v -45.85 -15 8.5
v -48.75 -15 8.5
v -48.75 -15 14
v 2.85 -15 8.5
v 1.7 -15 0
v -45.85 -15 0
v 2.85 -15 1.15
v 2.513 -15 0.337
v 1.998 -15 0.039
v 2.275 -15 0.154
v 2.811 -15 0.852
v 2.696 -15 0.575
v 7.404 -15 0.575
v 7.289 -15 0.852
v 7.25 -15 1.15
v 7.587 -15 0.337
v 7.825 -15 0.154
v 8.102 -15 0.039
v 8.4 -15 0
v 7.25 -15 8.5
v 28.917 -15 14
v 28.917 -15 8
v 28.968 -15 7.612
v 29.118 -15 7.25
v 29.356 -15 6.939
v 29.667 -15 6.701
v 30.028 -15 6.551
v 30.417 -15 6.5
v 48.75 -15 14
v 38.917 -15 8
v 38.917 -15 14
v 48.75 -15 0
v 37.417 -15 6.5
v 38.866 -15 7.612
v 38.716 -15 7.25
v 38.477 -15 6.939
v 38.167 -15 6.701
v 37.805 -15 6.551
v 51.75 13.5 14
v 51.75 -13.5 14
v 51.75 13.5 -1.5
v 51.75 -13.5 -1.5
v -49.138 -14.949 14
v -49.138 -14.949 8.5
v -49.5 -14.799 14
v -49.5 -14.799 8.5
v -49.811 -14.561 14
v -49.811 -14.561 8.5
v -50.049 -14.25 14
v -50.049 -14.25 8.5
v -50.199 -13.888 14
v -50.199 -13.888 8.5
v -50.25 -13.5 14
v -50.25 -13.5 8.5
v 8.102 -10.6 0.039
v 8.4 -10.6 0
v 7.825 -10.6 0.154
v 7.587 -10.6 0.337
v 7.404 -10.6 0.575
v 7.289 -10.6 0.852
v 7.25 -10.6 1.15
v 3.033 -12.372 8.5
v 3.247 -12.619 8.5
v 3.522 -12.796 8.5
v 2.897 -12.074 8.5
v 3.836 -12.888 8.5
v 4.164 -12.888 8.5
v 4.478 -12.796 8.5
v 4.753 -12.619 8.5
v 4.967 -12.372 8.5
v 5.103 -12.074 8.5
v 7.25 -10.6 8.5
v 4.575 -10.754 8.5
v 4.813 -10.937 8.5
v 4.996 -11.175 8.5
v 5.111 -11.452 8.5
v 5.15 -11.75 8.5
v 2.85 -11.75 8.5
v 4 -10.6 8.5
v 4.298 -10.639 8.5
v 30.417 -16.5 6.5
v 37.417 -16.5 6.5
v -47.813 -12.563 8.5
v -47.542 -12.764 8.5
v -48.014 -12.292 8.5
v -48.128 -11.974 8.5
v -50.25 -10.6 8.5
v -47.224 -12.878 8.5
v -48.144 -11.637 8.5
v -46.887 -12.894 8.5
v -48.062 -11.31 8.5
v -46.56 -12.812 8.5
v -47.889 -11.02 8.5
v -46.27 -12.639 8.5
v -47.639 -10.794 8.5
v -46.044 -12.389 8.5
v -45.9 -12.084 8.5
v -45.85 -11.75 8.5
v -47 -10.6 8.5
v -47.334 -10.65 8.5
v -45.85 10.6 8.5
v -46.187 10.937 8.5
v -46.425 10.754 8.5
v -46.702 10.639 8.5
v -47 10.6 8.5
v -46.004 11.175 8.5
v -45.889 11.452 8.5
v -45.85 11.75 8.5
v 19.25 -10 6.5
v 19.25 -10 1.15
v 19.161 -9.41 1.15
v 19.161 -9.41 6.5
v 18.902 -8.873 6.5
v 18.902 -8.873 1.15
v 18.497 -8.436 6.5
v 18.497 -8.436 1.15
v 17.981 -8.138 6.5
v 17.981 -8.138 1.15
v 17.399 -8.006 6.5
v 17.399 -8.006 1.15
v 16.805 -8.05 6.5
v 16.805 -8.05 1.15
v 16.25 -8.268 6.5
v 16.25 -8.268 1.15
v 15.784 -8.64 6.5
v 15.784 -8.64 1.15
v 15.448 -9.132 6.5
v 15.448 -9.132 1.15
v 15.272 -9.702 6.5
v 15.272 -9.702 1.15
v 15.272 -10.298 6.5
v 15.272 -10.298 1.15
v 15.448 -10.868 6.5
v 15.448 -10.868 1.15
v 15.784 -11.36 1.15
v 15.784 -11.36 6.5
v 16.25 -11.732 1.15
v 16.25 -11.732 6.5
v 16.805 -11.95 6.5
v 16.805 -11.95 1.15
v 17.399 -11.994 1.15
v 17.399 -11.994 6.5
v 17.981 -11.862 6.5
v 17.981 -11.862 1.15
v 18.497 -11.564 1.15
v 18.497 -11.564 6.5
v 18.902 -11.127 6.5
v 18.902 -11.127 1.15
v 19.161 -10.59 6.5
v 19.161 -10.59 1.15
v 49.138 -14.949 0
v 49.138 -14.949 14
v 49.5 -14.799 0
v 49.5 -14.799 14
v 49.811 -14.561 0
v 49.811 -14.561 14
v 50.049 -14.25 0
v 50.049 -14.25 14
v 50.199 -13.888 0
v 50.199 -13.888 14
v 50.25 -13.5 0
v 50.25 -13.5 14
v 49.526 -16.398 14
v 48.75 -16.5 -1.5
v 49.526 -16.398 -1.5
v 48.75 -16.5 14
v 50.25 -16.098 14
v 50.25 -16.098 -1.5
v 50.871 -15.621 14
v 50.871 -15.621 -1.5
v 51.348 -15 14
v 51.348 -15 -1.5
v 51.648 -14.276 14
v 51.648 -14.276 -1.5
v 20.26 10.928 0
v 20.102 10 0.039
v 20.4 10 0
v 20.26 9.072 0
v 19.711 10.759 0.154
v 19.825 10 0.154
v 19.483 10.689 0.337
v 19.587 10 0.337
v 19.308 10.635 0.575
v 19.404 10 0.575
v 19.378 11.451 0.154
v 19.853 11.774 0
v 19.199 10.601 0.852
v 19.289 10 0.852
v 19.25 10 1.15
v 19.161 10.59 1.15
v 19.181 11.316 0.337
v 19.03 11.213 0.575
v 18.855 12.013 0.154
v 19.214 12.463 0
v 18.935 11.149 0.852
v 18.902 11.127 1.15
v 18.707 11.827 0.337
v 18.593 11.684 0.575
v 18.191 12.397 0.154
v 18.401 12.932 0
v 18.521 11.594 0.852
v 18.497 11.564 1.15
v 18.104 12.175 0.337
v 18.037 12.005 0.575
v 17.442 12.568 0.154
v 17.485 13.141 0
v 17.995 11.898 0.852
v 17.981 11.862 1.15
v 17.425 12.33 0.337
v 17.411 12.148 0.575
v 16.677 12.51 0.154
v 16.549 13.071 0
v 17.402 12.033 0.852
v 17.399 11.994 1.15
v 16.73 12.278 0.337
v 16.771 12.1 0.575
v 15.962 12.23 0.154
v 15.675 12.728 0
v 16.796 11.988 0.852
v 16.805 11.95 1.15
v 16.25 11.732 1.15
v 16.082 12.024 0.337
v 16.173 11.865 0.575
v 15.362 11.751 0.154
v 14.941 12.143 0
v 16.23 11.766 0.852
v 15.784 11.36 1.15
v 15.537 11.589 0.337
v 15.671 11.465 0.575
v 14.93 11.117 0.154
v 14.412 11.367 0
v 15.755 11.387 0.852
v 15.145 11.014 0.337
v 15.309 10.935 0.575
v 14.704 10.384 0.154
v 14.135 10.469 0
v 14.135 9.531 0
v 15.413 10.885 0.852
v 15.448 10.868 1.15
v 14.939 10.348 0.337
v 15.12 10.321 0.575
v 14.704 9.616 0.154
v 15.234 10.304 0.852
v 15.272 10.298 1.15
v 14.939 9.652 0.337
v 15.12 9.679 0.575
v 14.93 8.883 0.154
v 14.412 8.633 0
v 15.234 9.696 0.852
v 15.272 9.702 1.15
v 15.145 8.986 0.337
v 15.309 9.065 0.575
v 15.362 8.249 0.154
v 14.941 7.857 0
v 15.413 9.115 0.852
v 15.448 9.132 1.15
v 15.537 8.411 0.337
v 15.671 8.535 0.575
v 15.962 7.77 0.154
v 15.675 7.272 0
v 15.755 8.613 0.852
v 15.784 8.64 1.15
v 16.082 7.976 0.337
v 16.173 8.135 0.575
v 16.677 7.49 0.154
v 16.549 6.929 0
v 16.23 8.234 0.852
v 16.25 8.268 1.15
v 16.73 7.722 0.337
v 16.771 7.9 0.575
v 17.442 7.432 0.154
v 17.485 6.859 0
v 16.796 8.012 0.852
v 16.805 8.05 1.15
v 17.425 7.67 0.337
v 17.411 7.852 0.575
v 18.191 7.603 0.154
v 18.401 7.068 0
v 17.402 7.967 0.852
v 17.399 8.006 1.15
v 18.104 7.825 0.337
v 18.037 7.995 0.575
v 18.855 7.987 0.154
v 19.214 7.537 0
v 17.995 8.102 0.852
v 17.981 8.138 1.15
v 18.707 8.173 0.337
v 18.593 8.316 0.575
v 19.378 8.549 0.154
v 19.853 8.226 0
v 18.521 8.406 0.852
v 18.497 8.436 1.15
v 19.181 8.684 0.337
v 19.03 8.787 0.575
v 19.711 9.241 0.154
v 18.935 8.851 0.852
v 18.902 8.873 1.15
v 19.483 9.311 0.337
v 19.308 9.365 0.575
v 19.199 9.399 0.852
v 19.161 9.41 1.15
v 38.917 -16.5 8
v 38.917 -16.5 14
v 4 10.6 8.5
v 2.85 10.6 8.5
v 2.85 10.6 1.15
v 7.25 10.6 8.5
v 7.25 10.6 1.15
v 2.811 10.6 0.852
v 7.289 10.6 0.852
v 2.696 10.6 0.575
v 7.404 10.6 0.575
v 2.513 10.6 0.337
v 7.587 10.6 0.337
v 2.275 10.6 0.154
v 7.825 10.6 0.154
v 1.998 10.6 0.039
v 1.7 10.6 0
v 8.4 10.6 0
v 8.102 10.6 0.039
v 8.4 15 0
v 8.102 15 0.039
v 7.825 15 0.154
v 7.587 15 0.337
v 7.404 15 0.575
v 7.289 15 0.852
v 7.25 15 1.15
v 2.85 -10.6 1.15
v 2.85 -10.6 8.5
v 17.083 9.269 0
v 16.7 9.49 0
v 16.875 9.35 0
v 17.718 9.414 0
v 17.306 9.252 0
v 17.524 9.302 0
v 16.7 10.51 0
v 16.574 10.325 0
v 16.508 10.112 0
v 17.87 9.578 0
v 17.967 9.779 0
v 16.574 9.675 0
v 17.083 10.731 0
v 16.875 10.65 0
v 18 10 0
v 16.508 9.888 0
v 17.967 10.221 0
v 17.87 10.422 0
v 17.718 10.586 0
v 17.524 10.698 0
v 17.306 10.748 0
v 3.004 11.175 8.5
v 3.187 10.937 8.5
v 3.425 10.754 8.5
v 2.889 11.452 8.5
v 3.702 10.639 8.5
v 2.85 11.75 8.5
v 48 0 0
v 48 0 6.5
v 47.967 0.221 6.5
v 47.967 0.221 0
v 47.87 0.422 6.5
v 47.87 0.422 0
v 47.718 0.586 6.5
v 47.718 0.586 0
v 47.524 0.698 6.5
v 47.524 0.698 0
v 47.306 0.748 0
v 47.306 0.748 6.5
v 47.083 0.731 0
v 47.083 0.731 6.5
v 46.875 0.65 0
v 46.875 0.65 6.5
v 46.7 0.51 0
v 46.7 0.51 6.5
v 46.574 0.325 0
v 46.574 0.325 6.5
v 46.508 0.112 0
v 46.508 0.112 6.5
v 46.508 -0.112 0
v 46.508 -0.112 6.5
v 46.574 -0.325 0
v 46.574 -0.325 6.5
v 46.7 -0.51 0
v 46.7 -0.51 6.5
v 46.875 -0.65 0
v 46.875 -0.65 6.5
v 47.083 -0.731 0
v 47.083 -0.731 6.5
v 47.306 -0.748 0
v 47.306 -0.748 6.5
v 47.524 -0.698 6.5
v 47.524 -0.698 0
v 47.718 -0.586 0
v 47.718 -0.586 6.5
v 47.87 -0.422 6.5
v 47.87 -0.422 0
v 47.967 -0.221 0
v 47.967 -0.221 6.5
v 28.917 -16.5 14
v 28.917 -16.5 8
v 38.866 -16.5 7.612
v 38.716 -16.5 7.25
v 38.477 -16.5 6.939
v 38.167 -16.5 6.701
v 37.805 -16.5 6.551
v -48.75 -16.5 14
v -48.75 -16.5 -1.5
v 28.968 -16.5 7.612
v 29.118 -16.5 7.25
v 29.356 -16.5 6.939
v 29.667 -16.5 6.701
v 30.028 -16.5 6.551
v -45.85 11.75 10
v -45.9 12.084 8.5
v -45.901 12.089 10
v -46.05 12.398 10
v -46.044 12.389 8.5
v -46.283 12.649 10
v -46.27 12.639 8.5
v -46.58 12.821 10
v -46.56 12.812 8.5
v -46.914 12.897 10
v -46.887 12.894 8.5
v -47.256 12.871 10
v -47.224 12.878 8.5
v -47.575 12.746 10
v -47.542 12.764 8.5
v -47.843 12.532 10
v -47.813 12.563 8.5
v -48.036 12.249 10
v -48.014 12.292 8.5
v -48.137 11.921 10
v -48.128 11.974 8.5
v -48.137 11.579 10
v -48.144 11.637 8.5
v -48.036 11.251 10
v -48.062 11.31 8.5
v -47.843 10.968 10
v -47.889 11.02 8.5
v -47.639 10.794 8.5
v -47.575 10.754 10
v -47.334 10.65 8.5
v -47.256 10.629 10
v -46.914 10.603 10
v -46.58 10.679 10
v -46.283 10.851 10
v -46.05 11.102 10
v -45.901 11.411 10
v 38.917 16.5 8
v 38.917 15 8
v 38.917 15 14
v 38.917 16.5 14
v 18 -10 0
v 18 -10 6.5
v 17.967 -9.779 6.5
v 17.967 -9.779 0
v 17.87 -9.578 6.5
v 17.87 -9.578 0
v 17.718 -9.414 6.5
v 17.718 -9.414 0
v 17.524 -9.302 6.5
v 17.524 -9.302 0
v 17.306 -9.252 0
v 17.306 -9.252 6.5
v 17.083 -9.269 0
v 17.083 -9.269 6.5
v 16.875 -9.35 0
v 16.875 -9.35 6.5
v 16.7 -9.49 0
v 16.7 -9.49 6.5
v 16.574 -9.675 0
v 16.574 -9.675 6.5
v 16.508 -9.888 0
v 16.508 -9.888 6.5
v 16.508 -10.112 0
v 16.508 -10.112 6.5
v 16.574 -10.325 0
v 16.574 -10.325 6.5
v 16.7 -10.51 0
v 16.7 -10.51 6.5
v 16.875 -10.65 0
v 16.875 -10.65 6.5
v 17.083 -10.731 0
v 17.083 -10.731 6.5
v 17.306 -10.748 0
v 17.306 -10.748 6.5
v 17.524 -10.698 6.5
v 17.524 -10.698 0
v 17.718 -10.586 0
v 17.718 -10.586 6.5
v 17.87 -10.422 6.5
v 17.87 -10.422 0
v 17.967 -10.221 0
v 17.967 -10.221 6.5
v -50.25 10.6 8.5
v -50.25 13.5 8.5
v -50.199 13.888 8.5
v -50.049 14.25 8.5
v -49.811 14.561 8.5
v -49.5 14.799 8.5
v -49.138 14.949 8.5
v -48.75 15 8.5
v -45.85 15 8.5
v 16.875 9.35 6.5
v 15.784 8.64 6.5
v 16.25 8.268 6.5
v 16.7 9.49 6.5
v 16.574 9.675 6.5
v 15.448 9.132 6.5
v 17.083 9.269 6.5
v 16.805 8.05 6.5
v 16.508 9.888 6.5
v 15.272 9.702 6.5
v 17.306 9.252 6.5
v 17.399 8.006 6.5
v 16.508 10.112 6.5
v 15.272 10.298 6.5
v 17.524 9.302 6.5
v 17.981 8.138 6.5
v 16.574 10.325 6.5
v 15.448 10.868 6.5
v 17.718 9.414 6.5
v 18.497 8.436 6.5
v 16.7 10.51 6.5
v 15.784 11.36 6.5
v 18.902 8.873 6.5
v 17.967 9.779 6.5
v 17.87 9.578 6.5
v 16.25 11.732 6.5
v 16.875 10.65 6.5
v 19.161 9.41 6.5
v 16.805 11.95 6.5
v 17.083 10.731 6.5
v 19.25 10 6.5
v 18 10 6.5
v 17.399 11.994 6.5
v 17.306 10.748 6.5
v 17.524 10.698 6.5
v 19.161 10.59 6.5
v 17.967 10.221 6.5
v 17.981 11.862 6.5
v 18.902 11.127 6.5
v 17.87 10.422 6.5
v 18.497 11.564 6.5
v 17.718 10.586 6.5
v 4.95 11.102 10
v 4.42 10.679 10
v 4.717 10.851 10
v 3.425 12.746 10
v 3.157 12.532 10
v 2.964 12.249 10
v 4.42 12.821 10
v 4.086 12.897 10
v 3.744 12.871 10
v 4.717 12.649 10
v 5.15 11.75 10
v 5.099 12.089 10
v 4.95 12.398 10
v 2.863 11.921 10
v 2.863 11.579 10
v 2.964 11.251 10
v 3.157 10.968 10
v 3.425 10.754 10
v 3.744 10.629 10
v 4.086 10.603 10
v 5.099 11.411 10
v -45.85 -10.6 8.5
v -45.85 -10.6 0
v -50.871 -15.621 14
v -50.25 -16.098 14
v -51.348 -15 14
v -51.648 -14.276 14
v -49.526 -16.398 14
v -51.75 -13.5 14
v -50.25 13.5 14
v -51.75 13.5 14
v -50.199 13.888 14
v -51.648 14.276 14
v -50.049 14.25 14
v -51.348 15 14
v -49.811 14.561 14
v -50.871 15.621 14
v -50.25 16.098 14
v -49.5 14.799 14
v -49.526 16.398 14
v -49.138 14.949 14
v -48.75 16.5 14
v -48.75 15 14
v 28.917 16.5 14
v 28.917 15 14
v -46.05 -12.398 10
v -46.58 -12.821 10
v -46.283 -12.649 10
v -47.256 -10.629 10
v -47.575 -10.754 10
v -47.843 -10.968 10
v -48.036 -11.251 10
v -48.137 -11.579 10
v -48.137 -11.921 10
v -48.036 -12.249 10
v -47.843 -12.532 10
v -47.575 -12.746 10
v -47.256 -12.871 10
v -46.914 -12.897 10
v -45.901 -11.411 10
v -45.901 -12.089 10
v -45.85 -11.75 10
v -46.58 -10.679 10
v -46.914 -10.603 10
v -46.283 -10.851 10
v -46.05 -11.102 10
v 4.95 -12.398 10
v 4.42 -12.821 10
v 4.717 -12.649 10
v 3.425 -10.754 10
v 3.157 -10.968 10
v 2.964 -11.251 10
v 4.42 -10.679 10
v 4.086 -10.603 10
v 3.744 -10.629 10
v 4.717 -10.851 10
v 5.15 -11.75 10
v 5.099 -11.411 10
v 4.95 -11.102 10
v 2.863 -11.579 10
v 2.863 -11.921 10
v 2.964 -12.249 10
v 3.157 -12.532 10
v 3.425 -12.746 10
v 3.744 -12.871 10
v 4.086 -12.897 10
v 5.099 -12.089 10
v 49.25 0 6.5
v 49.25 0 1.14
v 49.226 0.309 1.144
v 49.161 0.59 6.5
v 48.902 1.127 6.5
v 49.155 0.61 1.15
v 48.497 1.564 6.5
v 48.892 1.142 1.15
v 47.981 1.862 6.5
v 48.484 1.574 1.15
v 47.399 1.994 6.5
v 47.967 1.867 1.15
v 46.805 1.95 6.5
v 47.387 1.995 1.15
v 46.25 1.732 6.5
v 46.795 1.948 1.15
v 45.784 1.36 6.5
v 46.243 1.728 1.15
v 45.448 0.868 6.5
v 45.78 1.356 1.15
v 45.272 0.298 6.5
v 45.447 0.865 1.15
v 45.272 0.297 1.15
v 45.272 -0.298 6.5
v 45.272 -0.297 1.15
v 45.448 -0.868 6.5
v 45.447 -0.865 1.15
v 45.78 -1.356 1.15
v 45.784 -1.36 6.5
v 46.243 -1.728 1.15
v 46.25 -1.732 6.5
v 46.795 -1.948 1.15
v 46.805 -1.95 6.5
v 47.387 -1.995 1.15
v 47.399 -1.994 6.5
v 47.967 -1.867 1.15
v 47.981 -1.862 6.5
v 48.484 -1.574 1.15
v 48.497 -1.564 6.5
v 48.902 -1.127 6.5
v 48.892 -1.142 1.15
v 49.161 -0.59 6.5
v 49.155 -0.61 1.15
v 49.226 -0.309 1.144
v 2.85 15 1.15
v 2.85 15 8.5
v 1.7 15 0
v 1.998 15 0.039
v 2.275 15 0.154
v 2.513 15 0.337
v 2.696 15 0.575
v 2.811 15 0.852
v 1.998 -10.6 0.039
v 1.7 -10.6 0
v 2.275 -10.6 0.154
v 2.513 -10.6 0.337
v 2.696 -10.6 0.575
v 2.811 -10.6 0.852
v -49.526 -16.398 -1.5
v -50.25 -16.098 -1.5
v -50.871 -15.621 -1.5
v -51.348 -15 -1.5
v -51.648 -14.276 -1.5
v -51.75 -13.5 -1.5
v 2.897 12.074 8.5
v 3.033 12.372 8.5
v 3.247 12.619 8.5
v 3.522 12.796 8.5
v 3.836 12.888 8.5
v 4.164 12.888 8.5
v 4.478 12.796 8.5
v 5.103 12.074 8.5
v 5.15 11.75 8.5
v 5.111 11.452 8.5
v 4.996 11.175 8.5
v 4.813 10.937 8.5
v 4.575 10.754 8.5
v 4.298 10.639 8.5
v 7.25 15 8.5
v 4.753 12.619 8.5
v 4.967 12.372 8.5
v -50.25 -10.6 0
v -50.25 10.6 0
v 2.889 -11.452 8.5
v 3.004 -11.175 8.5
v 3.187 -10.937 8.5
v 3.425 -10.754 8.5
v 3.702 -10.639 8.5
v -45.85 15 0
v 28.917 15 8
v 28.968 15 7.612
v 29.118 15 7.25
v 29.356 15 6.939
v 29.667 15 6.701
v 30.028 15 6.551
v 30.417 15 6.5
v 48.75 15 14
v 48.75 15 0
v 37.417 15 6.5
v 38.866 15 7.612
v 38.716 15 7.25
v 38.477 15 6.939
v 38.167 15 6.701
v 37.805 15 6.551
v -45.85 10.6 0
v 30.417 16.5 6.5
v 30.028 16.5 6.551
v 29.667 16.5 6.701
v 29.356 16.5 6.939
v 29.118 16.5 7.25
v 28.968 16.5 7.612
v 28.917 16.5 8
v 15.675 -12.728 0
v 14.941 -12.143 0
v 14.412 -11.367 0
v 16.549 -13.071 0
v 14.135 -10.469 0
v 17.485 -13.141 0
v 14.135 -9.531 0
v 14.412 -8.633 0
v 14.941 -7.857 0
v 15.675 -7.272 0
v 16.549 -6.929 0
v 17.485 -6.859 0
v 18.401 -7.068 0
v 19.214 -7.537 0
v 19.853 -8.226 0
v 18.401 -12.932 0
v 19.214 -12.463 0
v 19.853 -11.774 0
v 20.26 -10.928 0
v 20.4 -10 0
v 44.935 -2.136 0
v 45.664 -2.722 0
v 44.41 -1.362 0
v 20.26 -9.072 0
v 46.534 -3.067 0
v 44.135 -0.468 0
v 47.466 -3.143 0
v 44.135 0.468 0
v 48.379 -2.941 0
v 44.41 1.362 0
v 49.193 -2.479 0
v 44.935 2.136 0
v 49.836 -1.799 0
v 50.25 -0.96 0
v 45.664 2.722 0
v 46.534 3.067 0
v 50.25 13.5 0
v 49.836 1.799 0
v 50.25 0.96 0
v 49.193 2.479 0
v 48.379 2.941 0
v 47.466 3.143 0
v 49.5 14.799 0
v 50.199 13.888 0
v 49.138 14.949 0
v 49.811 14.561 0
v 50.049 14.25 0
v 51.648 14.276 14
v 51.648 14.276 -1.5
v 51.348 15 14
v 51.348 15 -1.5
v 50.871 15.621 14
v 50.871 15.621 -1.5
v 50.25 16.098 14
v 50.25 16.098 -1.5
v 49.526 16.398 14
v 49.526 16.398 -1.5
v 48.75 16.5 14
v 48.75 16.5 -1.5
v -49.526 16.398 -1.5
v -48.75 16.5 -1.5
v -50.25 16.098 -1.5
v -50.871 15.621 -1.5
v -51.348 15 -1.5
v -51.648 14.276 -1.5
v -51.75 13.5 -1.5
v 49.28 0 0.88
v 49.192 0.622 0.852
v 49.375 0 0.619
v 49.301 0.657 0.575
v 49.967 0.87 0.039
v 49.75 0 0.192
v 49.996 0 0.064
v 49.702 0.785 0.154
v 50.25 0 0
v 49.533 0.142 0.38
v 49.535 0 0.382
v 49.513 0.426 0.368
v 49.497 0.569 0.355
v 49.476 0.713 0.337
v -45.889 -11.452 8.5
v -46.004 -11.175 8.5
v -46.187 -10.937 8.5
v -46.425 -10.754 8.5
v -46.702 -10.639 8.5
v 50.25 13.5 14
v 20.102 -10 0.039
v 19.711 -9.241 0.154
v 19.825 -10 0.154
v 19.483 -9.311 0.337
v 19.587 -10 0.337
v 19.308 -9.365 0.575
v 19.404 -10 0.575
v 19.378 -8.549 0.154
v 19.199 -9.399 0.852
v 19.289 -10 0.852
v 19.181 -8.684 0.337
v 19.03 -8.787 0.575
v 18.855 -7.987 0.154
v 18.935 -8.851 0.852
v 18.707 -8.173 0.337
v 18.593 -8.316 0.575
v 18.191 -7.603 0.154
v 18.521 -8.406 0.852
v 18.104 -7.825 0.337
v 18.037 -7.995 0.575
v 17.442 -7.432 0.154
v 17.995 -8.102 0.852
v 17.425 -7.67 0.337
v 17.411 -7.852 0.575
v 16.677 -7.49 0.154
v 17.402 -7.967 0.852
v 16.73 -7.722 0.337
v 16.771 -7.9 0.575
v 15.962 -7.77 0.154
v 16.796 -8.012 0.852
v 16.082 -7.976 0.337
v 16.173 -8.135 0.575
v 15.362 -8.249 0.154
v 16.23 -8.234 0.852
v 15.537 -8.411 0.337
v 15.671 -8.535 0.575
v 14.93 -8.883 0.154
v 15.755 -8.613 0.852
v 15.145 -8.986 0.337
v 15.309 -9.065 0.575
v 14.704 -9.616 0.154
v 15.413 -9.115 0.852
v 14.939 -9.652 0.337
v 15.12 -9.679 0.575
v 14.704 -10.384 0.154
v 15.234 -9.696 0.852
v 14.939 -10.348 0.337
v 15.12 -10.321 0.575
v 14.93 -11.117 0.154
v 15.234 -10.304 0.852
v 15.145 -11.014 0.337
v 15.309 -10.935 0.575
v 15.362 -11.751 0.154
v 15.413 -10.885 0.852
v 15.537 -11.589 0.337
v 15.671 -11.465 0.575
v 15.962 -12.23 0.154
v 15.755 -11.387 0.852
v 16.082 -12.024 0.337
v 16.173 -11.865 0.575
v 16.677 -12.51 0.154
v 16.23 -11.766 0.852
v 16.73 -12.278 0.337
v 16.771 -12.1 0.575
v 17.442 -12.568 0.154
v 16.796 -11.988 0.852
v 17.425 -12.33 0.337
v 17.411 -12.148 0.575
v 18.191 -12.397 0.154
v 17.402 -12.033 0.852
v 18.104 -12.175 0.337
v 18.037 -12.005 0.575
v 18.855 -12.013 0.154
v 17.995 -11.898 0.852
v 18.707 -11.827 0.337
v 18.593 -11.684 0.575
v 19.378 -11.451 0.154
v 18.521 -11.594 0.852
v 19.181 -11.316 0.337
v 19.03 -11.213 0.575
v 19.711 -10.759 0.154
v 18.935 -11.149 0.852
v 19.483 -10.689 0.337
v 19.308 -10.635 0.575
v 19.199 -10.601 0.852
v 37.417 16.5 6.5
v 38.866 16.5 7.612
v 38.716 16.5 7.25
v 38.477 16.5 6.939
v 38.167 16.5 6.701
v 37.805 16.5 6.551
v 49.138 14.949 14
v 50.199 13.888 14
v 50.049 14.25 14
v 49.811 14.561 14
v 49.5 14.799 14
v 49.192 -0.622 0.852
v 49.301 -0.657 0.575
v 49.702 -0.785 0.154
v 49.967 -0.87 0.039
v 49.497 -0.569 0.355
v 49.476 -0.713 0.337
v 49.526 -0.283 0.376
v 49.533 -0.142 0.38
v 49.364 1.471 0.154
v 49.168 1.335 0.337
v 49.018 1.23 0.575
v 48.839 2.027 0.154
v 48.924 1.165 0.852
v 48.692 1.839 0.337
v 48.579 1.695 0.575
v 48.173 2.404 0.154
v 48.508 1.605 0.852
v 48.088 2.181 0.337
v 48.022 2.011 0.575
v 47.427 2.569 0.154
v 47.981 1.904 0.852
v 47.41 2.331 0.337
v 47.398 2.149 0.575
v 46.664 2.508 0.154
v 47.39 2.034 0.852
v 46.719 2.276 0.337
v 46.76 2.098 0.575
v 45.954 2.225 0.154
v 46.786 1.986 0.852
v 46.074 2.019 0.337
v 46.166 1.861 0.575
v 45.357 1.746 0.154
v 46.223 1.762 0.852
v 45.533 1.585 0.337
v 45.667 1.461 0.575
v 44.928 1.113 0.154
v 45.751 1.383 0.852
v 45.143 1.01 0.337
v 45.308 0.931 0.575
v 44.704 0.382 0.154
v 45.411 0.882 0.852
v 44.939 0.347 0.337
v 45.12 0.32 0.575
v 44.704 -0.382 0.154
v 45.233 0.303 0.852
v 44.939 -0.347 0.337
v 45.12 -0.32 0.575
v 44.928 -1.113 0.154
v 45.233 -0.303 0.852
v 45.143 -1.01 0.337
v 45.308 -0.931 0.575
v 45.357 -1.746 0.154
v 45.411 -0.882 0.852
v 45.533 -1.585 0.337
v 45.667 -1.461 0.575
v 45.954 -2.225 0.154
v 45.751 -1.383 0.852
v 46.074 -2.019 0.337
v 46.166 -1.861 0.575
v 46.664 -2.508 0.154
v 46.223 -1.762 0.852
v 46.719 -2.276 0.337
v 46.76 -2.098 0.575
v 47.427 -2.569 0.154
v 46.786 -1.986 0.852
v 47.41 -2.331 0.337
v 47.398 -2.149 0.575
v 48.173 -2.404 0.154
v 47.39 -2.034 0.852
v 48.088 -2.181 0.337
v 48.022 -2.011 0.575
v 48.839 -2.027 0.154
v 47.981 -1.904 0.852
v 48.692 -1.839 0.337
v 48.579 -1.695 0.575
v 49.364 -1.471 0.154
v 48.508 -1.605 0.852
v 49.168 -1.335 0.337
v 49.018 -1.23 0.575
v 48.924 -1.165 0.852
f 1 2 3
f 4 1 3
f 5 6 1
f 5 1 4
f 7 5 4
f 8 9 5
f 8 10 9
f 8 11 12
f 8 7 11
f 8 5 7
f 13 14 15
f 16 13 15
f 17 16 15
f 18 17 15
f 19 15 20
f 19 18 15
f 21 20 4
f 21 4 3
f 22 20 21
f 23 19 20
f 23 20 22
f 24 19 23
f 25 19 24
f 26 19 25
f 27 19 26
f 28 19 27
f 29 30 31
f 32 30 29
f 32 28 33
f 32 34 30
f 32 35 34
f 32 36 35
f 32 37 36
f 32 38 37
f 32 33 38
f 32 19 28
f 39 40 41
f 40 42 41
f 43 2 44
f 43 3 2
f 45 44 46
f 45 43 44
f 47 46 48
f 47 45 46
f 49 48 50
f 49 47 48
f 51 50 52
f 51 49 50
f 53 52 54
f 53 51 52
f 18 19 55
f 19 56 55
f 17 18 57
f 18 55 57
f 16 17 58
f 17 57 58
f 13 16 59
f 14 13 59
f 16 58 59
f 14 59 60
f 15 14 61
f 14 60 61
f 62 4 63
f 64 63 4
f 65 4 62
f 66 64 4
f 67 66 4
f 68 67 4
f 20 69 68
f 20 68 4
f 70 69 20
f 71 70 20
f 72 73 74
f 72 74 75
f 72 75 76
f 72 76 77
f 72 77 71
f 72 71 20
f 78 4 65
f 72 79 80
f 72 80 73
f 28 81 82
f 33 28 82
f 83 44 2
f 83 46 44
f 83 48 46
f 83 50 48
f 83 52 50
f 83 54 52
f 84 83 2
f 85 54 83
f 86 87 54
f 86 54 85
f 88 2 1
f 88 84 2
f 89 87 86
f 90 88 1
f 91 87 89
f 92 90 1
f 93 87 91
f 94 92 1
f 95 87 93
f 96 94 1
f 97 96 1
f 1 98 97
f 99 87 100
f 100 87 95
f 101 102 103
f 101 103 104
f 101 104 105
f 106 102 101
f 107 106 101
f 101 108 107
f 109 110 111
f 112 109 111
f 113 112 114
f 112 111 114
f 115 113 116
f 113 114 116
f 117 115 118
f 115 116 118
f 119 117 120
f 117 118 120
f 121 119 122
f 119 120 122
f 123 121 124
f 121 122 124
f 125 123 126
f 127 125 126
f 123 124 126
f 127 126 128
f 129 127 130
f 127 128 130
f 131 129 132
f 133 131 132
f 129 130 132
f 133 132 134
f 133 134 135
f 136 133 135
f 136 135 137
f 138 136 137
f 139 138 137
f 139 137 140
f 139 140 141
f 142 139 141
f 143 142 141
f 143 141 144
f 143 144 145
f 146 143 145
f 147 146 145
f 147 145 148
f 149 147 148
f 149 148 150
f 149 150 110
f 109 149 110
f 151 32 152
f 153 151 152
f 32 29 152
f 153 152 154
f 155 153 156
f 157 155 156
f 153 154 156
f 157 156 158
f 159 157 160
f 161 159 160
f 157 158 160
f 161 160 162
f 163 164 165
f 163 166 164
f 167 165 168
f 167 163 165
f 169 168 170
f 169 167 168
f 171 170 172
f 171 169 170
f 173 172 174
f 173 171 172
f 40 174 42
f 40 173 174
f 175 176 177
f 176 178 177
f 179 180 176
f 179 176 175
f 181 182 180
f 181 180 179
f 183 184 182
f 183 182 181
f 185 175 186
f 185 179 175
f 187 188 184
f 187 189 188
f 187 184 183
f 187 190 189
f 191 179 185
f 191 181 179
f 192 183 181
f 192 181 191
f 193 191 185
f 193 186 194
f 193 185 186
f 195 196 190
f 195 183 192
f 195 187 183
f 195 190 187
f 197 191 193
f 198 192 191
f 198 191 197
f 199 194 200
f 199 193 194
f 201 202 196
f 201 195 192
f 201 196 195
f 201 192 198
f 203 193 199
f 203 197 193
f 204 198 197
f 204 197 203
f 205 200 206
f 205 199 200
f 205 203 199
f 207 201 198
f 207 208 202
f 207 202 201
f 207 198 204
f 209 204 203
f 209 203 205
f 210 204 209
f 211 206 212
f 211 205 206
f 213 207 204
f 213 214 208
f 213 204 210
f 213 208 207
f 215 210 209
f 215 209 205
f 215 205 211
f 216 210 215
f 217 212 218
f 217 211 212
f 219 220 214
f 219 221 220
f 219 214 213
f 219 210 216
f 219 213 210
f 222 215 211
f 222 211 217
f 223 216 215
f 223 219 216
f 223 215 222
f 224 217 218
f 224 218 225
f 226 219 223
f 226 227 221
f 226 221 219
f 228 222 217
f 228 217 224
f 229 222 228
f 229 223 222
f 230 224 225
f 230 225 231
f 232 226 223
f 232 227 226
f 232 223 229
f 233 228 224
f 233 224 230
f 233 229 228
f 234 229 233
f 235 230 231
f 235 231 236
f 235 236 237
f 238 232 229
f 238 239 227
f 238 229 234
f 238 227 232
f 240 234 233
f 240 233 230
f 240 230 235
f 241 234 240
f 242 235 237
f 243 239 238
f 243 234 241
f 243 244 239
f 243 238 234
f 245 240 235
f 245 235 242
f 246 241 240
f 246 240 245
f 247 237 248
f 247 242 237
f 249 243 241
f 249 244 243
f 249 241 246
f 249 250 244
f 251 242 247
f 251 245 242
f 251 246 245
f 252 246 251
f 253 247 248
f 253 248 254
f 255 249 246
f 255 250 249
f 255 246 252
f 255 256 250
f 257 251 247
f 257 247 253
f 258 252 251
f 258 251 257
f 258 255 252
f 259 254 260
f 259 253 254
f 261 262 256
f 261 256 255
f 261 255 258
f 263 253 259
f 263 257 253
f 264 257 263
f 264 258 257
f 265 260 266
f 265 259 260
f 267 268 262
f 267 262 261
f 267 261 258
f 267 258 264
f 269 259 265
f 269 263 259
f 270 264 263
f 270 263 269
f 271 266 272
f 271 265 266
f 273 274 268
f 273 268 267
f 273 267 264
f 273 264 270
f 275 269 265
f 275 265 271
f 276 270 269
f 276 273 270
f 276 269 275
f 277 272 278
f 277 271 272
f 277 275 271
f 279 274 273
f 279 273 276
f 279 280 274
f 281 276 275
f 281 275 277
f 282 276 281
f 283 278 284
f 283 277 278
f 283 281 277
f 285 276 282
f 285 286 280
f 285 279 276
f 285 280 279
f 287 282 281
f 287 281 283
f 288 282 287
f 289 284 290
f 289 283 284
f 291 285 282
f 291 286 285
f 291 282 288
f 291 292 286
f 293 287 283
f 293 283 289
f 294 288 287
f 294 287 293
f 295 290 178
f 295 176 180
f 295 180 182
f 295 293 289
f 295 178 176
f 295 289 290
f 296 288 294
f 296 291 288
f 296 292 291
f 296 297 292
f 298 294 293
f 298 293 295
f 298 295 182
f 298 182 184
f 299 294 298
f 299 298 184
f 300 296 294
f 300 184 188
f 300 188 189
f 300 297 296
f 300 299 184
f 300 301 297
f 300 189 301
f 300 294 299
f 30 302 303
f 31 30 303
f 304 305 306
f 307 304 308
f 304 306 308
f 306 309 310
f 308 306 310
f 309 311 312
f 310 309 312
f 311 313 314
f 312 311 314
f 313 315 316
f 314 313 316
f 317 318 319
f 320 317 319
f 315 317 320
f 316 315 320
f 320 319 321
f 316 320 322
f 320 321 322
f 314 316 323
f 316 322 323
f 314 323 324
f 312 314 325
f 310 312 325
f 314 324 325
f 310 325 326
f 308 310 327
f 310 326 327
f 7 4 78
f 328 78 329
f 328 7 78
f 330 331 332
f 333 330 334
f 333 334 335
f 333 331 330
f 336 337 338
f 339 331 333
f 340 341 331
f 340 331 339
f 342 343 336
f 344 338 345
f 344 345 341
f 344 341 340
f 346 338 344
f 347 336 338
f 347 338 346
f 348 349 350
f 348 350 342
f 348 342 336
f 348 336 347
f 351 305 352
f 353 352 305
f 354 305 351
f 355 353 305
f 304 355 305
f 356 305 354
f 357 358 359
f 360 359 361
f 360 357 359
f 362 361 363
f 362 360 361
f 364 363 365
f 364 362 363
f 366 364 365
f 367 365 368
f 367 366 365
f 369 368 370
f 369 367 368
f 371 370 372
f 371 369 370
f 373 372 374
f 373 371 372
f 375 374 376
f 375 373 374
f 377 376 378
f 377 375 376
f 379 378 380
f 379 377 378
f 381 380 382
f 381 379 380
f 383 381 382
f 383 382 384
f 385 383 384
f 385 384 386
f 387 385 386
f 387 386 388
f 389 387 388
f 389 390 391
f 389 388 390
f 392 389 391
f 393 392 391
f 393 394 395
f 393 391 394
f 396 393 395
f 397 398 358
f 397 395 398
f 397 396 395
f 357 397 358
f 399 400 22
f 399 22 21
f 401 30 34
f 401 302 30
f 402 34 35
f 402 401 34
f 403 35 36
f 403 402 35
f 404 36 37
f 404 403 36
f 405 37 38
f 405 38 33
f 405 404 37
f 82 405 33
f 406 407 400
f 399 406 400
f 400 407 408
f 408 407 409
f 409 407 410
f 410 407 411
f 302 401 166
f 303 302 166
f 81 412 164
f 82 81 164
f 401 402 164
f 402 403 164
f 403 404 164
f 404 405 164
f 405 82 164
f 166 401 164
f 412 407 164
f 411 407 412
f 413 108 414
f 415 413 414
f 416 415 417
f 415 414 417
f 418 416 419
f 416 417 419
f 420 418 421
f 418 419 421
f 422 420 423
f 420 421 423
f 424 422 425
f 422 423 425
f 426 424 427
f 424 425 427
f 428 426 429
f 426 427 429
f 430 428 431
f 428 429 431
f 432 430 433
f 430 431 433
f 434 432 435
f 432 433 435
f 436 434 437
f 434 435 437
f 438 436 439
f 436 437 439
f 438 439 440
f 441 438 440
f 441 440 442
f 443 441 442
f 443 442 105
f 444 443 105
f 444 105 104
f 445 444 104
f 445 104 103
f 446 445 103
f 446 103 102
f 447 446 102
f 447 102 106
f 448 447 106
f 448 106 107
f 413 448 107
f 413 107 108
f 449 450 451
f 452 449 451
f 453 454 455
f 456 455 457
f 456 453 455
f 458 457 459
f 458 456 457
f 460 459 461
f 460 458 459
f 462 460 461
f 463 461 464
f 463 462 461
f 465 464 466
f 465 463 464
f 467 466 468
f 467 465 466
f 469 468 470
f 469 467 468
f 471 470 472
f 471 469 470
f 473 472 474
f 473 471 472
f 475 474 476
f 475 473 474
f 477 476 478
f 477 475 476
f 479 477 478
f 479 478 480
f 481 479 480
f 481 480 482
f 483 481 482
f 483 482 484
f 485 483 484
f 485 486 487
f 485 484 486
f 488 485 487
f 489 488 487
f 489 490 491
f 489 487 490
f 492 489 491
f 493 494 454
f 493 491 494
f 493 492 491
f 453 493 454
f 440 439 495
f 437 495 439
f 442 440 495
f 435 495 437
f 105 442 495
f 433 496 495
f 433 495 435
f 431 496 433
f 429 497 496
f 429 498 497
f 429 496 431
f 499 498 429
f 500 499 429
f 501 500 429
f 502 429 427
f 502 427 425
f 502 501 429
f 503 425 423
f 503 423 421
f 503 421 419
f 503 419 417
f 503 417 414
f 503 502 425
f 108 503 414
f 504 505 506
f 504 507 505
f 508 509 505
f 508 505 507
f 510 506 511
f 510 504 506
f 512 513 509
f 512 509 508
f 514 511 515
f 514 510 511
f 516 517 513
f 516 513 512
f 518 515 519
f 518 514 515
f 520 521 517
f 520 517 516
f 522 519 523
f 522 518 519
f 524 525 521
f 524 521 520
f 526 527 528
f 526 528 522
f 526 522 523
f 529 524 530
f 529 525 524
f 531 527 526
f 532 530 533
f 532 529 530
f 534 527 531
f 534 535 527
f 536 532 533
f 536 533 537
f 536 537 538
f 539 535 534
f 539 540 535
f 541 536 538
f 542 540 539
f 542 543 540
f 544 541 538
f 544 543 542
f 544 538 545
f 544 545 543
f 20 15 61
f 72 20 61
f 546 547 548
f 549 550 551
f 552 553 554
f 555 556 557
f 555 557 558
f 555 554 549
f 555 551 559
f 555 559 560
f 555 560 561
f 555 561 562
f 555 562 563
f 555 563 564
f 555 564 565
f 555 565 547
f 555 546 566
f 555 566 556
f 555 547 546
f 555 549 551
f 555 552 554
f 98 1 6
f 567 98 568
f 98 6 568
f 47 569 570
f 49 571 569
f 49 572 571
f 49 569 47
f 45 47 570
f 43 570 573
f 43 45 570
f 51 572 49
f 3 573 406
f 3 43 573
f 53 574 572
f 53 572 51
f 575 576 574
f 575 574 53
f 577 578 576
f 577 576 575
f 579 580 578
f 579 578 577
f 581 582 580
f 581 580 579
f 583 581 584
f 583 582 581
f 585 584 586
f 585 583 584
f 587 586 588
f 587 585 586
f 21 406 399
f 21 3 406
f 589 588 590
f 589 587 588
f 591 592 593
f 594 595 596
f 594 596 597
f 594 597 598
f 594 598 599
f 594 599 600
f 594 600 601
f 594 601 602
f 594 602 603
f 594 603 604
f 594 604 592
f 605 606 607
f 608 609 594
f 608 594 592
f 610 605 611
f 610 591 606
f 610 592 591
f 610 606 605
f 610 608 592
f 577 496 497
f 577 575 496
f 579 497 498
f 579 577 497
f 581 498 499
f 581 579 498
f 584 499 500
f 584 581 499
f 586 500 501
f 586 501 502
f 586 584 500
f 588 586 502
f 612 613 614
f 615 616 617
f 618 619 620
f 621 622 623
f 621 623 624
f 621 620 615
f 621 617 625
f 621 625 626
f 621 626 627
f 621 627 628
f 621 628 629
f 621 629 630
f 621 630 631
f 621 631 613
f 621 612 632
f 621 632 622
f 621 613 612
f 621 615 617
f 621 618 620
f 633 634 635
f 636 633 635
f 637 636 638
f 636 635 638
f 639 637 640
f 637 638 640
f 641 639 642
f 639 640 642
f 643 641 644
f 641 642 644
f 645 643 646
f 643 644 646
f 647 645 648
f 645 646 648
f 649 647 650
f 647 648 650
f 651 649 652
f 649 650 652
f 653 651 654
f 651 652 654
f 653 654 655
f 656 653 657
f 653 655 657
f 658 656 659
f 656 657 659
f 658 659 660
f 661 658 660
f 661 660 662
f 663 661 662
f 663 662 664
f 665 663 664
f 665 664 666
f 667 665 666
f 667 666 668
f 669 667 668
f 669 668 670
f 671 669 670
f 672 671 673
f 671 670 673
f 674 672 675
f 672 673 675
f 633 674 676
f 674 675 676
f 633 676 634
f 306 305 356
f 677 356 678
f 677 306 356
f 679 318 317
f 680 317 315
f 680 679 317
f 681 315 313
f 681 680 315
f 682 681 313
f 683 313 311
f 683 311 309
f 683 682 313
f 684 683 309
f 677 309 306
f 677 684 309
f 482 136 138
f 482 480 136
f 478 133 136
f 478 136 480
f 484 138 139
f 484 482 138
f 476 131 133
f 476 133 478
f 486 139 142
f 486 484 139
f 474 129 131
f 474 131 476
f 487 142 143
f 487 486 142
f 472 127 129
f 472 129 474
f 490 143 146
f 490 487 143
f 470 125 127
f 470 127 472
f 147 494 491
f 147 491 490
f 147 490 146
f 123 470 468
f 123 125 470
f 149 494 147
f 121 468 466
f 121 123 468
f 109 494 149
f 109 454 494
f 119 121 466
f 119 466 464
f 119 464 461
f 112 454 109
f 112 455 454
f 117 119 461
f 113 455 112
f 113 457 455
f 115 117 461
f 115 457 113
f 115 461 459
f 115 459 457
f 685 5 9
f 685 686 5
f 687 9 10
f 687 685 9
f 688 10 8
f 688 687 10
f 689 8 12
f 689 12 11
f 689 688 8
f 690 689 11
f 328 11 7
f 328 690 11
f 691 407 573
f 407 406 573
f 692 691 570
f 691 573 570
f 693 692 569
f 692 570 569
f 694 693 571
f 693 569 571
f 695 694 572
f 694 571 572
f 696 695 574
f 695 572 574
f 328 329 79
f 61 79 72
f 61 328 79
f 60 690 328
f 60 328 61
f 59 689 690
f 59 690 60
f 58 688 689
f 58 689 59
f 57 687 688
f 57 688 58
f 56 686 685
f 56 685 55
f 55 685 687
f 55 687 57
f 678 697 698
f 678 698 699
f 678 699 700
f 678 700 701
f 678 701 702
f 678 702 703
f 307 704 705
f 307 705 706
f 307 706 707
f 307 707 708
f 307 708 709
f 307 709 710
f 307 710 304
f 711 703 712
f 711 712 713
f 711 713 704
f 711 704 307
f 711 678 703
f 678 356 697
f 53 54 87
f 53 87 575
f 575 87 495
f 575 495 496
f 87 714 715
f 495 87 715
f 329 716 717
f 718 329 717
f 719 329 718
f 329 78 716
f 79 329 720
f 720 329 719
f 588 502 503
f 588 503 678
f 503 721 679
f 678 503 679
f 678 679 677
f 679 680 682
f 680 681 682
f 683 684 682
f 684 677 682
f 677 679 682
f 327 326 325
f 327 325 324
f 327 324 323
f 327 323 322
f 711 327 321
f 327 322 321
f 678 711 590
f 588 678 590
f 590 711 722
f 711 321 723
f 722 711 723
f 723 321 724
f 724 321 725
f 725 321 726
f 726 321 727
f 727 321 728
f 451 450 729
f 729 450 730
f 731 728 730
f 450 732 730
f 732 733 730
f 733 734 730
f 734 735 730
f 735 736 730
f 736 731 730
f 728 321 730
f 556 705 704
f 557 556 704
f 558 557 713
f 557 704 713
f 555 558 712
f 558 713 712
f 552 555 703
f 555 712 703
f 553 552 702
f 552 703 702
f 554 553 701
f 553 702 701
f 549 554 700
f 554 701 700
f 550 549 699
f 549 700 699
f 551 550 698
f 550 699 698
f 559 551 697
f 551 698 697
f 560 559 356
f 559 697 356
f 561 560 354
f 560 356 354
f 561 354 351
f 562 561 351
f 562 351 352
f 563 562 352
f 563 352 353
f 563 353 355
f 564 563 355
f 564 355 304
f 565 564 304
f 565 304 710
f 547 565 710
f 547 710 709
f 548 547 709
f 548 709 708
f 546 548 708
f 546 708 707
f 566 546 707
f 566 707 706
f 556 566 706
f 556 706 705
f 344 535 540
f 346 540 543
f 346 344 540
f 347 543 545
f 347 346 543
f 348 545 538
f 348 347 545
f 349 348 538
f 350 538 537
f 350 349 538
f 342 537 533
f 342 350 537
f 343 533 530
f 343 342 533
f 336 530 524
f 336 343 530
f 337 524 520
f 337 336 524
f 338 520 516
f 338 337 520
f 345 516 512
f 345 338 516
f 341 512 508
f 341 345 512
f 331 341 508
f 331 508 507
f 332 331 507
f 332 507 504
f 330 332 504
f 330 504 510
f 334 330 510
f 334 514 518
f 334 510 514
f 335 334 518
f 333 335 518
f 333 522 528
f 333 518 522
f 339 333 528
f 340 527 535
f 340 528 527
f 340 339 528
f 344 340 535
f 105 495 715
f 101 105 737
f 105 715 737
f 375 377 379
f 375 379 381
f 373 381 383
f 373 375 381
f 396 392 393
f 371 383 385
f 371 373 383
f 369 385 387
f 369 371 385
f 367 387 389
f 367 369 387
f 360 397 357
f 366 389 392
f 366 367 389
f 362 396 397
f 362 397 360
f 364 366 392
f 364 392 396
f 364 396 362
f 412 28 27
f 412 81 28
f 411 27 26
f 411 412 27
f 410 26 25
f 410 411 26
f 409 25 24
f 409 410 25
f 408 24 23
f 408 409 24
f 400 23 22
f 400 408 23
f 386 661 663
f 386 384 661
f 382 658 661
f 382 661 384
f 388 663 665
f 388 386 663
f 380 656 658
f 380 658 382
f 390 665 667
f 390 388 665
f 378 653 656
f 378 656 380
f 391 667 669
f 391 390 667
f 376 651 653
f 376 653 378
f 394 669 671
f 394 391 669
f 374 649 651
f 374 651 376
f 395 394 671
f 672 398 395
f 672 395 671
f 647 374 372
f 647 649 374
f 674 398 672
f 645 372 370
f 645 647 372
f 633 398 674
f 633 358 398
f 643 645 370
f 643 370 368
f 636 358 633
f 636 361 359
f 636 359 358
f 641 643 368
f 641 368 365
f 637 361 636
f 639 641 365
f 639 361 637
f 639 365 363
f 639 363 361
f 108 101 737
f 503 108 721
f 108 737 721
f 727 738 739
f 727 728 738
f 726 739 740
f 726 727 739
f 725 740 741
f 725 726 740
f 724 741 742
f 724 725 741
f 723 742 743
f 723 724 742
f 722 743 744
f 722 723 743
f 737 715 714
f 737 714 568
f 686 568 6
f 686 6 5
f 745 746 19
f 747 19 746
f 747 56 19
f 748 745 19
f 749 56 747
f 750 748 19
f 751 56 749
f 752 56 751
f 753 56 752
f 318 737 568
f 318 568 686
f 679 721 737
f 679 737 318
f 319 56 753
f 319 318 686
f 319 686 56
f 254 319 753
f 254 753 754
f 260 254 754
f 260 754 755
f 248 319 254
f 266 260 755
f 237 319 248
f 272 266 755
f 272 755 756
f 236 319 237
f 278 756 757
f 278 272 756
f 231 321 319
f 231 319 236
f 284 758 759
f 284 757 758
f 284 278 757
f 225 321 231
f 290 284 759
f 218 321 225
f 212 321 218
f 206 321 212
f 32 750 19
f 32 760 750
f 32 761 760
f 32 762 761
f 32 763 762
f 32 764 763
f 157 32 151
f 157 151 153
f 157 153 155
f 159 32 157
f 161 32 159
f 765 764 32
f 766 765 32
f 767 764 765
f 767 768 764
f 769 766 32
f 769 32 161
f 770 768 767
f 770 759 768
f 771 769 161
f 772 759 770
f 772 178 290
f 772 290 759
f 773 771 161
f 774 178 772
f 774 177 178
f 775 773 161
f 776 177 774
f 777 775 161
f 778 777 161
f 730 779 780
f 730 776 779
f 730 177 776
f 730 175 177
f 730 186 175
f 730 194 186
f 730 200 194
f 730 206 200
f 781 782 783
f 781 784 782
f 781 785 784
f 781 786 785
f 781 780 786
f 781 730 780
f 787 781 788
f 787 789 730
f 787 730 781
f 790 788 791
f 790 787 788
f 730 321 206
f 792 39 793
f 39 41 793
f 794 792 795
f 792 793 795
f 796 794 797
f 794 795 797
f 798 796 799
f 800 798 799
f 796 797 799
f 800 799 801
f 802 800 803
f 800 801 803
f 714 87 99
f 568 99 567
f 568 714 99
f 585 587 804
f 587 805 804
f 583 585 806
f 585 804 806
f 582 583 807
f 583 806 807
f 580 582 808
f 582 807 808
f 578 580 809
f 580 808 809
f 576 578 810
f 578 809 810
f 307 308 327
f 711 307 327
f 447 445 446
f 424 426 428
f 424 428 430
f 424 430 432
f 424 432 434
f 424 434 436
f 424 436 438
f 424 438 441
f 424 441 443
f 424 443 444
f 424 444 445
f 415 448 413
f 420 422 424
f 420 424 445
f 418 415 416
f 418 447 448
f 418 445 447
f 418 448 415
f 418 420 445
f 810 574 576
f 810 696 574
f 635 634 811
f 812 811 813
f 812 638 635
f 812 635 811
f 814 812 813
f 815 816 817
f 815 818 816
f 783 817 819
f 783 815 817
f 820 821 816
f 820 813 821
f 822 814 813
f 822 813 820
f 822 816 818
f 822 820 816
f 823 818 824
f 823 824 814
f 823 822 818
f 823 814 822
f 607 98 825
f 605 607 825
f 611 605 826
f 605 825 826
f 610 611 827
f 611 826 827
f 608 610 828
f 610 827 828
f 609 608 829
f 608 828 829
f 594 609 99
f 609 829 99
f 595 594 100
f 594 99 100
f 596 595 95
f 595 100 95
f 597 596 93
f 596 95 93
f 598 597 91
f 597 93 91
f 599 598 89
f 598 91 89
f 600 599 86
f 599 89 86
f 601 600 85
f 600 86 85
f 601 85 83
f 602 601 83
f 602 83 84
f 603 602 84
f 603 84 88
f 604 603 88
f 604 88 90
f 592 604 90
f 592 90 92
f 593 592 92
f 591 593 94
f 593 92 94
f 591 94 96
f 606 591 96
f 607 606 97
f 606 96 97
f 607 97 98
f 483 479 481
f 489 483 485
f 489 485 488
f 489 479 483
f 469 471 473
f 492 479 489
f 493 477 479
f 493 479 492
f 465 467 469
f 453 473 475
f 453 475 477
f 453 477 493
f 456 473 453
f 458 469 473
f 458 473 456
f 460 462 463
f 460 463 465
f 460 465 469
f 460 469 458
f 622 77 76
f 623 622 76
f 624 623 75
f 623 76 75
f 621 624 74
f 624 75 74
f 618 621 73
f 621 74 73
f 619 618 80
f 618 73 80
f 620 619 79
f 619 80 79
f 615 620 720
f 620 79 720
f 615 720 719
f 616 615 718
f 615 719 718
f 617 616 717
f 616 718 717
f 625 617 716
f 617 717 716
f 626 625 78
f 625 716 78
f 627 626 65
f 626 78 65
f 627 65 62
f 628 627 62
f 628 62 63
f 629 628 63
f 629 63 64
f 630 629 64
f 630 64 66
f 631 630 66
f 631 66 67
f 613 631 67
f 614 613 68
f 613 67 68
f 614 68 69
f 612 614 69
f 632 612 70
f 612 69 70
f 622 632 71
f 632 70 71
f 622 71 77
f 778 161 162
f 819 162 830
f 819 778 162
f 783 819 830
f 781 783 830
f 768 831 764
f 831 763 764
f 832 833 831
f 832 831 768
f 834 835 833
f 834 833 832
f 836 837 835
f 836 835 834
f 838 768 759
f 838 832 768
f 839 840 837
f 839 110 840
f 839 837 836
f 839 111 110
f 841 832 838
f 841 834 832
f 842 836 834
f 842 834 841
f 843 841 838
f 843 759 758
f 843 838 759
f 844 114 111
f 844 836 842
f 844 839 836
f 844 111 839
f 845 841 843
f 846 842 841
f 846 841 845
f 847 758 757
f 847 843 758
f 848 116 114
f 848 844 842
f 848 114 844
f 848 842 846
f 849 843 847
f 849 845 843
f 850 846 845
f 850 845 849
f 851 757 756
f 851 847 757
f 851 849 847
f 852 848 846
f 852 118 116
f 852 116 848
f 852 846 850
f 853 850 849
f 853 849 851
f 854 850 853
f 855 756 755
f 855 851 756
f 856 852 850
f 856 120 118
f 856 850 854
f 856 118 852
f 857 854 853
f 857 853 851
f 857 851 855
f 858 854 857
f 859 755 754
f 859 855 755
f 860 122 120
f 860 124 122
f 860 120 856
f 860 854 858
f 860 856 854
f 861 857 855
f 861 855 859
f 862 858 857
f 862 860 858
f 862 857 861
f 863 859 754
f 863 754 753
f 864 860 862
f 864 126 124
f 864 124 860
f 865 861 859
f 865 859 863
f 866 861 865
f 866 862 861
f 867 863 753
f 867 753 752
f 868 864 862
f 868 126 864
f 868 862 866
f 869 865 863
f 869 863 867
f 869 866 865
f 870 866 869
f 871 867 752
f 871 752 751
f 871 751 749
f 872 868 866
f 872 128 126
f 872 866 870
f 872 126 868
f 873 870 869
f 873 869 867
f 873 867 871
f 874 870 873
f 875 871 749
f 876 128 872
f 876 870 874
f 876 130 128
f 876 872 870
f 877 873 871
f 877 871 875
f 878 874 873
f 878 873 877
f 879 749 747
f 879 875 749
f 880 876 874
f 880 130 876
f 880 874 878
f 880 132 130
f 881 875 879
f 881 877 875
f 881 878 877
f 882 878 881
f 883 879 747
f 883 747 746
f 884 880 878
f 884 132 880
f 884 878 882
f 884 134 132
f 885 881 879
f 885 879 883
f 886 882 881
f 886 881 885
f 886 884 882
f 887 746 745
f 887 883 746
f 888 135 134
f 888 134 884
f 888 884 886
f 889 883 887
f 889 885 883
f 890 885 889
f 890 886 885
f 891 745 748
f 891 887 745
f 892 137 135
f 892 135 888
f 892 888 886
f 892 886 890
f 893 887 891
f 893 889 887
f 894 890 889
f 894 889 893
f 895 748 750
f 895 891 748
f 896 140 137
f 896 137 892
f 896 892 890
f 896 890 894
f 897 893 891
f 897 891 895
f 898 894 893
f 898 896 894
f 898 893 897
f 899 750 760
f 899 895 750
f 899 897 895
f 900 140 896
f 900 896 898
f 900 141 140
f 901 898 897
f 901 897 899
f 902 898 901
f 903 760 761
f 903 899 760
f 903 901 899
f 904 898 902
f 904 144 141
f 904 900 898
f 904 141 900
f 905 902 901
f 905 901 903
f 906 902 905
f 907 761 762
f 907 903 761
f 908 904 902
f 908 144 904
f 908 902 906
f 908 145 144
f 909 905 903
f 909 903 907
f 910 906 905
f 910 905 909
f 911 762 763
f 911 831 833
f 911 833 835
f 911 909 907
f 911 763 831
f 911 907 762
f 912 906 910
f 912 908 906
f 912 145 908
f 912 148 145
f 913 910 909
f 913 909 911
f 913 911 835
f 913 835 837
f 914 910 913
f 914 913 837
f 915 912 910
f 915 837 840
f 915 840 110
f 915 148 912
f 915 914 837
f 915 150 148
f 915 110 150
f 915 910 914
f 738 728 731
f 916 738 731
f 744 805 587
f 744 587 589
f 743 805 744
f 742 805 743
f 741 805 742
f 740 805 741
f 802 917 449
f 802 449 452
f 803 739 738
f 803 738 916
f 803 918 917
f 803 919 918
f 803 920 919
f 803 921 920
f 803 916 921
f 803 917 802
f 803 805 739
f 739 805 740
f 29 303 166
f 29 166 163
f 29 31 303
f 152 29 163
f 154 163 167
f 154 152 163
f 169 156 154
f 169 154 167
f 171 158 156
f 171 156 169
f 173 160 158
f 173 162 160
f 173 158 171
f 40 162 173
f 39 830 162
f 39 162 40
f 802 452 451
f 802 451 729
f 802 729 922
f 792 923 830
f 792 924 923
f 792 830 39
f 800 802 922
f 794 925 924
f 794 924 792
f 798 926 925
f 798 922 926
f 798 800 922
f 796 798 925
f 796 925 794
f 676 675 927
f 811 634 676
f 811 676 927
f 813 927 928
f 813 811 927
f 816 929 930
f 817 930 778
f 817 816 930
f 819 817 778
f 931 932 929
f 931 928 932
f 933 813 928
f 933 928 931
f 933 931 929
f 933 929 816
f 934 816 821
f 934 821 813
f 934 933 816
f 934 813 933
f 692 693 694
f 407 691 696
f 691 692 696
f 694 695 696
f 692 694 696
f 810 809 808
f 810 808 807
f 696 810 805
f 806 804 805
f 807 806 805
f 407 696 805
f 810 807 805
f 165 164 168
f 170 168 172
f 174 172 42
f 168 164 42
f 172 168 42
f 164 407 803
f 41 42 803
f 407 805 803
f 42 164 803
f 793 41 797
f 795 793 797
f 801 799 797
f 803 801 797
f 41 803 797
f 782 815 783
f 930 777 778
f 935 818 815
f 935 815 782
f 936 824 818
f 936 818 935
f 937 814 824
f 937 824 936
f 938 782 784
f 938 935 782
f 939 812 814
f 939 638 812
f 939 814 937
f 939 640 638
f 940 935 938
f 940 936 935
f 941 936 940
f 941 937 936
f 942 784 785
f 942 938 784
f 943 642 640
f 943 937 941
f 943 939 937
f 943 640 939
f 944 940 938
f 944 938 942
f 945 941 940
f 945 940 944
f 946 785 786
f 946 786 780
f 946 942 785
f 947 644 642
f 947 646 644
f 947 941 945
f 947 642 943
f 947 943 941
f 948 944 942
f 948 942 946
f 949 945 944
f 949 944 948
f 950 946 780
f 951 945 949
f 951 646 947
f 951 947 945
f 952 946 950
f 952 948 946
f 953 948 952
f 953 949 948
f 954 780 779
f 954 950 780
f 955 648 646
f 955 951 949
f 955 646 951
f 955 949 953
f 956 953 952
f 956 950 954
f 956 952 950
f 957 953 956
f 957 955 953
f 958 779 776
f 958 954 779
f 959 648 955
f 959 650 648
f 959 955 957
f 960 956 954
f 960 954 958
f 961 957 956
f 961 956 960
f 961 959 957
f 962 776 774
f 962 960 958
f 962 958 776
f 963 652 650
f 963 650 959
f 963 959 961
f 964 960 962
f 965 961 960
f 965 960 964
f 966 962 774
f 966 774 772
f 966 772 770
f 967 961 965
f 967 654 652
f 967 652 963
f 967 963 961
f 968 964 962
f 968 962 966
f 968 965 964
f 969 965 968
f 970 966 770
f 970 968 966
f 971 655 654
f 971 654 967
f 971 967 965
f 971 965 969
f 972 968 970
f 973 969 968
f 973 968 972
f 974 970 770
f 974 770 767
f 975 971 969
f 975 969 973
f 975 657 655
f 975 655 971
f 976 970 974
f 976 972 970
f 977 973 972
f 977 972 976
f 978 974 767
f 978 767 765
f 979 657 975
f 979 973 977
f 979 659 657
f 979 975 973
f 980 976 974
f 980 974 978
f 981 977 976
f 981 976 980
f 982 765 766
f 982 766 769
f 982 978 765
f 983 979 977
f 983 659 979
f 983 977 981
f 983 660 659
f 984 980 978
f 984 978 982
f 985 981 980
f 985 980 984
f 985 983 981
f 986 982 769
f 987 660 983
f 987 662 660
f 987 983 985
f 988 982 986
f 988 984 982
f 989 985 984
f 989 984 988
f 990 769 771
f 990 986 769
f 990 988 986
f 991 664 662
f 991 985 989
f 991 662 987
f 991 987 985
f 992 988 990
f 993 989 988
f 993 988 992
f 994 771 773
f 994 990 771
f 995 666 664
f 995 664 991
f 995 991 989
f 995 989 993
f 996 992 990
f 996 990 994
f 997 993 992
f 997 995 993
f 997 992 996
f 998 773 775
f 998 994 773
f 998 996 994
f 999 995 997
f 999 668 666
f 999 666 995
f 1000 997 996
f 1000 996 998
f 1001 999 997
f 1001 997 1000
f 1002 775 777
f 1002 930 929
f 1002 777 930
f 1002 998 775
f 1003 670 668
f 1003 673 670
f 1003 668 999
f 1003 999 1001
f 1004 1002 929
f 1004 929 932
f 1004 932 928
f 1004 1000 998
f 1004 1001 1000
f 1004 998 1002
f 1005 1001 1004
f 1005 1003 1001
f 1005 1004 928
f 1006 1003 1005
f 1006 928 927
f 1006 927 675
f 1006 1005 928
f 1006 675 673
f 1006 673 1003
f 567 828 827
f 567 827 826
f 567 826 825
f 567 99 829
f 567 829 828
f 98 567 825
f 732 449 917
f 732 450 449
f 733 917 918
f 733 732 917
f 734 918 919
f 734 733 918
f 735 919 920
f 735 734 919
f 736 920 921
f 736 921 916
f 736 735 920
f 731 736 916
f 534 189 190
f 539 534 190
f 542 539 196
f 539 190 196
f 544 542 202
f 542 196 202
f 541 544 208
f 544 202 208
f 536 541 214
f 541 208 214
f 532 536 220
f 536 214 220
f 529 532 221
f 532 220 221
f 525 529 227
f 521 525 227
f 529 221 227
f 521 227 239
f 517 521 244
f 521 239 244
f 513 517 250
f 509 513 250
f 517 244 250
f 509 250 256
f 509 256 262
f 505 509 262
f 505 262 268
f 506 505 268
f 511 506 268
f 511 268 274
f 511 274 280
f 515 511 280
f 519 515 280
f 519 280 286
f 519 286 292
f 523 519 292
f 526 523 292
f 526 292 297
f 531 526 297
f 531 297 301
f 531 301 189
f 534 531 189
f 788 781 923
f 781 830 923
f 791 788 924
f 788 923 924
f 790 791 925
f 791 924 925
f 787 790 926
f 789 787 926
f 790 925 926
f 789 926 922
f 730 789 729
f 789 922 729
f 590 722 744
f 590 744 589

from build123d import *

# Parameters (mm, degrees)
SKETCH001_W     = 103.5
SKETCH001_H     = 33
PAD_DEPTH       = 1.5
SKETCH002_W     = 103.5
SKETCH002_H     = 33
SKETCH002_W_2   = 100.5
SKETCH002_H_2   = 30
PAD001_DEPTH    = 14
SKETCH003_R     = 1.15
SKETCH003_R_2   = 2
SKETCH003_R_3   = 0.75
PAD002_DEPTH    = 10
SKETCH004_W     = 4.4
SKETCH004_H     = 4.4
PAD003_DEPTH    = 8.5
FILLET_R        = 1.15
SKETCH005_R     = 2
POCKET_DEPTH    = 3.5
SKETCH006_W     = 9.999999
SKETCH006_H     = 7.5
POCKET001_DEPTH = 16.6
FILLET001_R     = 1.5
FILLET002_R     = 1.5
FILLET003_R     = 3


with BuildPart() as part:
    # Sketch001 → Pad (new body)
    with BuildSketch(Plane.XY):
        Rectangle(SKETCH001_W, SKETCH001_H)
    extrude(amount=-PAD_DEPTH)

    # Sketch002 (on Face5 of Pad) → Pad001 (join)
    with BuildSketch(Plane.XY):
        Rectangle(SKETCH002_W, SKETCH002_H)
        Rectangle(SKETCH002_W_2, SKETCH002_H_2, mode=Mode.SUBTRACT)
    extrude(amount=PAD001_DEPTH)

    # Sketch003 (on Face15 of Pad001) → Pad002 (join)
    with BuildSketch(Plane.XY):
        with Locations((4, -11.75)):
            Circle(SKETCH003_R)
        with Locations((-47, -11.75)):
            Circle(SKETCH003_R)
        with Locations((-47, 11.75)):
            Circle(SKETCH003_R)
        with Locations((4, 11.75)):
            Circle(SKETCH003_R)
        with Locations((17.25, 10)):
            Circle(SKETCH003_R_2)
        with Locations((17.25, 10)):
            Circle(SKETCH003_R_3, mode=Mode.SUBTRACT)
        with Locations((17.25, -10)):
            Circle(SKETCH003_R_2)
        with Locations((17.25, -10)):
            Circle(SKETCH003_R_3, mode=Mode.SUBTRACT)
        with Locations((47.25, 0)):
            Circle(SKETCH003_R_2)
        with Locations((47.25, 0)):
            Circle(SKETCH003_R_3, mode=Mode.SUBTRACT)
    extrude(amount=PAD002_DEPTH)

    # Sketch004 (on Face15 of Pad002) → Pad003 (join)
    with BuildSketch(Plane.XY):
        with Locations((-48.05, 12.8)):
            Rectangle(SKETCH004_W, SKETCH004_H)
        with Locations((-48.05, -12.8)):
            Rectangle(SKETCH004_W, SKETCH004_H)
        with Locations((5.05, 12.8)):
            Rectangle(SKETCH004_W, SKETCH004_H)
        with Locations((5.05, -12.8)):
            Rectangle(SKETCH004_W, SKETCH004_H)
    extrude(amount=PAD003_DEPTH)

    # Fillet
    fillet_edges = [part.edges().sort_by_distance(p)[0] for p in [
        (45.25, 0, 0),
        (15.25, 10, 0),
        (15.25, -10, 0),
        (2.85, 13.375, 0),
        (2.85, 11.175, 0),
        (2.85, -11.175, 0),
        (2.85, -13.375, 0),
        (7.25, 12.8, 0),
        (7.25, -12.8, 0),
    ]]
    fillet(fillet_edges, radius=FILLET_R)

    # Sketch005 (on Face62 of Fillet) → Pocket (cut)
    with BuildSketch(Plane.XY.offset(10)):
        with Locations((17.25, 10)):
            Circle(SKETCH005_R)
        with Locations((17.25, -10)):
            Circle(SKETCH005_R)
        with Locations((47.25, 0)):
            Circle(SKETCH005_R)
    extrude(amount=-POCKET_DEPTH, mode=Mode.SUBTRACT)

    # Sketch006 → Pocket001 (cut, symmetric)
    with BuildSketch(Plane.XZ):
        with Locations((33.916666, 10.25)):
            Rectangle(SKETCH006_W, SKETCH006_H)
    extrude(amount=POCKET001_DEPTH, both=True, mode=Mode.SUBTRACT)

    # Fillet001
    fillet001_edges = [part.edges().sort_by_distance(p)[0] for p in [
        (38.916666, -15.75, 6.5),
        (38.916666, 15.75, 6.5),
        (28.916667, -15.75, 6.5),
        (28.916667, 15.75, 6.5),
    ]]
    fillet(fillet001_edges, radius=FILLET001_R)

    # Fillet002
    fillet002_edges = [part.edges().sort_by_distance(p)[0] for p in [
        (50.25, 15, 7),
        (50.25, -15, 7),
        (-50.25, 15, 11.25),
        (-50.25, -15, 11.25),
    ]]
    fillet(fillet002_edges, radius=FILLET002_R)

    # Fillet003
    fillet003_edges = [part.edges().sort_by_distance(p)[0] for p in [
        (-51.75, -16.5, 7),
        (51.75, -16.5, 7),
        (51.75, 16.5, 7),
        (-51.75, 16.5, 7),
    ]]
    fillet(fillet003_edges, radius=FILLET003_R)


solid = part.part
